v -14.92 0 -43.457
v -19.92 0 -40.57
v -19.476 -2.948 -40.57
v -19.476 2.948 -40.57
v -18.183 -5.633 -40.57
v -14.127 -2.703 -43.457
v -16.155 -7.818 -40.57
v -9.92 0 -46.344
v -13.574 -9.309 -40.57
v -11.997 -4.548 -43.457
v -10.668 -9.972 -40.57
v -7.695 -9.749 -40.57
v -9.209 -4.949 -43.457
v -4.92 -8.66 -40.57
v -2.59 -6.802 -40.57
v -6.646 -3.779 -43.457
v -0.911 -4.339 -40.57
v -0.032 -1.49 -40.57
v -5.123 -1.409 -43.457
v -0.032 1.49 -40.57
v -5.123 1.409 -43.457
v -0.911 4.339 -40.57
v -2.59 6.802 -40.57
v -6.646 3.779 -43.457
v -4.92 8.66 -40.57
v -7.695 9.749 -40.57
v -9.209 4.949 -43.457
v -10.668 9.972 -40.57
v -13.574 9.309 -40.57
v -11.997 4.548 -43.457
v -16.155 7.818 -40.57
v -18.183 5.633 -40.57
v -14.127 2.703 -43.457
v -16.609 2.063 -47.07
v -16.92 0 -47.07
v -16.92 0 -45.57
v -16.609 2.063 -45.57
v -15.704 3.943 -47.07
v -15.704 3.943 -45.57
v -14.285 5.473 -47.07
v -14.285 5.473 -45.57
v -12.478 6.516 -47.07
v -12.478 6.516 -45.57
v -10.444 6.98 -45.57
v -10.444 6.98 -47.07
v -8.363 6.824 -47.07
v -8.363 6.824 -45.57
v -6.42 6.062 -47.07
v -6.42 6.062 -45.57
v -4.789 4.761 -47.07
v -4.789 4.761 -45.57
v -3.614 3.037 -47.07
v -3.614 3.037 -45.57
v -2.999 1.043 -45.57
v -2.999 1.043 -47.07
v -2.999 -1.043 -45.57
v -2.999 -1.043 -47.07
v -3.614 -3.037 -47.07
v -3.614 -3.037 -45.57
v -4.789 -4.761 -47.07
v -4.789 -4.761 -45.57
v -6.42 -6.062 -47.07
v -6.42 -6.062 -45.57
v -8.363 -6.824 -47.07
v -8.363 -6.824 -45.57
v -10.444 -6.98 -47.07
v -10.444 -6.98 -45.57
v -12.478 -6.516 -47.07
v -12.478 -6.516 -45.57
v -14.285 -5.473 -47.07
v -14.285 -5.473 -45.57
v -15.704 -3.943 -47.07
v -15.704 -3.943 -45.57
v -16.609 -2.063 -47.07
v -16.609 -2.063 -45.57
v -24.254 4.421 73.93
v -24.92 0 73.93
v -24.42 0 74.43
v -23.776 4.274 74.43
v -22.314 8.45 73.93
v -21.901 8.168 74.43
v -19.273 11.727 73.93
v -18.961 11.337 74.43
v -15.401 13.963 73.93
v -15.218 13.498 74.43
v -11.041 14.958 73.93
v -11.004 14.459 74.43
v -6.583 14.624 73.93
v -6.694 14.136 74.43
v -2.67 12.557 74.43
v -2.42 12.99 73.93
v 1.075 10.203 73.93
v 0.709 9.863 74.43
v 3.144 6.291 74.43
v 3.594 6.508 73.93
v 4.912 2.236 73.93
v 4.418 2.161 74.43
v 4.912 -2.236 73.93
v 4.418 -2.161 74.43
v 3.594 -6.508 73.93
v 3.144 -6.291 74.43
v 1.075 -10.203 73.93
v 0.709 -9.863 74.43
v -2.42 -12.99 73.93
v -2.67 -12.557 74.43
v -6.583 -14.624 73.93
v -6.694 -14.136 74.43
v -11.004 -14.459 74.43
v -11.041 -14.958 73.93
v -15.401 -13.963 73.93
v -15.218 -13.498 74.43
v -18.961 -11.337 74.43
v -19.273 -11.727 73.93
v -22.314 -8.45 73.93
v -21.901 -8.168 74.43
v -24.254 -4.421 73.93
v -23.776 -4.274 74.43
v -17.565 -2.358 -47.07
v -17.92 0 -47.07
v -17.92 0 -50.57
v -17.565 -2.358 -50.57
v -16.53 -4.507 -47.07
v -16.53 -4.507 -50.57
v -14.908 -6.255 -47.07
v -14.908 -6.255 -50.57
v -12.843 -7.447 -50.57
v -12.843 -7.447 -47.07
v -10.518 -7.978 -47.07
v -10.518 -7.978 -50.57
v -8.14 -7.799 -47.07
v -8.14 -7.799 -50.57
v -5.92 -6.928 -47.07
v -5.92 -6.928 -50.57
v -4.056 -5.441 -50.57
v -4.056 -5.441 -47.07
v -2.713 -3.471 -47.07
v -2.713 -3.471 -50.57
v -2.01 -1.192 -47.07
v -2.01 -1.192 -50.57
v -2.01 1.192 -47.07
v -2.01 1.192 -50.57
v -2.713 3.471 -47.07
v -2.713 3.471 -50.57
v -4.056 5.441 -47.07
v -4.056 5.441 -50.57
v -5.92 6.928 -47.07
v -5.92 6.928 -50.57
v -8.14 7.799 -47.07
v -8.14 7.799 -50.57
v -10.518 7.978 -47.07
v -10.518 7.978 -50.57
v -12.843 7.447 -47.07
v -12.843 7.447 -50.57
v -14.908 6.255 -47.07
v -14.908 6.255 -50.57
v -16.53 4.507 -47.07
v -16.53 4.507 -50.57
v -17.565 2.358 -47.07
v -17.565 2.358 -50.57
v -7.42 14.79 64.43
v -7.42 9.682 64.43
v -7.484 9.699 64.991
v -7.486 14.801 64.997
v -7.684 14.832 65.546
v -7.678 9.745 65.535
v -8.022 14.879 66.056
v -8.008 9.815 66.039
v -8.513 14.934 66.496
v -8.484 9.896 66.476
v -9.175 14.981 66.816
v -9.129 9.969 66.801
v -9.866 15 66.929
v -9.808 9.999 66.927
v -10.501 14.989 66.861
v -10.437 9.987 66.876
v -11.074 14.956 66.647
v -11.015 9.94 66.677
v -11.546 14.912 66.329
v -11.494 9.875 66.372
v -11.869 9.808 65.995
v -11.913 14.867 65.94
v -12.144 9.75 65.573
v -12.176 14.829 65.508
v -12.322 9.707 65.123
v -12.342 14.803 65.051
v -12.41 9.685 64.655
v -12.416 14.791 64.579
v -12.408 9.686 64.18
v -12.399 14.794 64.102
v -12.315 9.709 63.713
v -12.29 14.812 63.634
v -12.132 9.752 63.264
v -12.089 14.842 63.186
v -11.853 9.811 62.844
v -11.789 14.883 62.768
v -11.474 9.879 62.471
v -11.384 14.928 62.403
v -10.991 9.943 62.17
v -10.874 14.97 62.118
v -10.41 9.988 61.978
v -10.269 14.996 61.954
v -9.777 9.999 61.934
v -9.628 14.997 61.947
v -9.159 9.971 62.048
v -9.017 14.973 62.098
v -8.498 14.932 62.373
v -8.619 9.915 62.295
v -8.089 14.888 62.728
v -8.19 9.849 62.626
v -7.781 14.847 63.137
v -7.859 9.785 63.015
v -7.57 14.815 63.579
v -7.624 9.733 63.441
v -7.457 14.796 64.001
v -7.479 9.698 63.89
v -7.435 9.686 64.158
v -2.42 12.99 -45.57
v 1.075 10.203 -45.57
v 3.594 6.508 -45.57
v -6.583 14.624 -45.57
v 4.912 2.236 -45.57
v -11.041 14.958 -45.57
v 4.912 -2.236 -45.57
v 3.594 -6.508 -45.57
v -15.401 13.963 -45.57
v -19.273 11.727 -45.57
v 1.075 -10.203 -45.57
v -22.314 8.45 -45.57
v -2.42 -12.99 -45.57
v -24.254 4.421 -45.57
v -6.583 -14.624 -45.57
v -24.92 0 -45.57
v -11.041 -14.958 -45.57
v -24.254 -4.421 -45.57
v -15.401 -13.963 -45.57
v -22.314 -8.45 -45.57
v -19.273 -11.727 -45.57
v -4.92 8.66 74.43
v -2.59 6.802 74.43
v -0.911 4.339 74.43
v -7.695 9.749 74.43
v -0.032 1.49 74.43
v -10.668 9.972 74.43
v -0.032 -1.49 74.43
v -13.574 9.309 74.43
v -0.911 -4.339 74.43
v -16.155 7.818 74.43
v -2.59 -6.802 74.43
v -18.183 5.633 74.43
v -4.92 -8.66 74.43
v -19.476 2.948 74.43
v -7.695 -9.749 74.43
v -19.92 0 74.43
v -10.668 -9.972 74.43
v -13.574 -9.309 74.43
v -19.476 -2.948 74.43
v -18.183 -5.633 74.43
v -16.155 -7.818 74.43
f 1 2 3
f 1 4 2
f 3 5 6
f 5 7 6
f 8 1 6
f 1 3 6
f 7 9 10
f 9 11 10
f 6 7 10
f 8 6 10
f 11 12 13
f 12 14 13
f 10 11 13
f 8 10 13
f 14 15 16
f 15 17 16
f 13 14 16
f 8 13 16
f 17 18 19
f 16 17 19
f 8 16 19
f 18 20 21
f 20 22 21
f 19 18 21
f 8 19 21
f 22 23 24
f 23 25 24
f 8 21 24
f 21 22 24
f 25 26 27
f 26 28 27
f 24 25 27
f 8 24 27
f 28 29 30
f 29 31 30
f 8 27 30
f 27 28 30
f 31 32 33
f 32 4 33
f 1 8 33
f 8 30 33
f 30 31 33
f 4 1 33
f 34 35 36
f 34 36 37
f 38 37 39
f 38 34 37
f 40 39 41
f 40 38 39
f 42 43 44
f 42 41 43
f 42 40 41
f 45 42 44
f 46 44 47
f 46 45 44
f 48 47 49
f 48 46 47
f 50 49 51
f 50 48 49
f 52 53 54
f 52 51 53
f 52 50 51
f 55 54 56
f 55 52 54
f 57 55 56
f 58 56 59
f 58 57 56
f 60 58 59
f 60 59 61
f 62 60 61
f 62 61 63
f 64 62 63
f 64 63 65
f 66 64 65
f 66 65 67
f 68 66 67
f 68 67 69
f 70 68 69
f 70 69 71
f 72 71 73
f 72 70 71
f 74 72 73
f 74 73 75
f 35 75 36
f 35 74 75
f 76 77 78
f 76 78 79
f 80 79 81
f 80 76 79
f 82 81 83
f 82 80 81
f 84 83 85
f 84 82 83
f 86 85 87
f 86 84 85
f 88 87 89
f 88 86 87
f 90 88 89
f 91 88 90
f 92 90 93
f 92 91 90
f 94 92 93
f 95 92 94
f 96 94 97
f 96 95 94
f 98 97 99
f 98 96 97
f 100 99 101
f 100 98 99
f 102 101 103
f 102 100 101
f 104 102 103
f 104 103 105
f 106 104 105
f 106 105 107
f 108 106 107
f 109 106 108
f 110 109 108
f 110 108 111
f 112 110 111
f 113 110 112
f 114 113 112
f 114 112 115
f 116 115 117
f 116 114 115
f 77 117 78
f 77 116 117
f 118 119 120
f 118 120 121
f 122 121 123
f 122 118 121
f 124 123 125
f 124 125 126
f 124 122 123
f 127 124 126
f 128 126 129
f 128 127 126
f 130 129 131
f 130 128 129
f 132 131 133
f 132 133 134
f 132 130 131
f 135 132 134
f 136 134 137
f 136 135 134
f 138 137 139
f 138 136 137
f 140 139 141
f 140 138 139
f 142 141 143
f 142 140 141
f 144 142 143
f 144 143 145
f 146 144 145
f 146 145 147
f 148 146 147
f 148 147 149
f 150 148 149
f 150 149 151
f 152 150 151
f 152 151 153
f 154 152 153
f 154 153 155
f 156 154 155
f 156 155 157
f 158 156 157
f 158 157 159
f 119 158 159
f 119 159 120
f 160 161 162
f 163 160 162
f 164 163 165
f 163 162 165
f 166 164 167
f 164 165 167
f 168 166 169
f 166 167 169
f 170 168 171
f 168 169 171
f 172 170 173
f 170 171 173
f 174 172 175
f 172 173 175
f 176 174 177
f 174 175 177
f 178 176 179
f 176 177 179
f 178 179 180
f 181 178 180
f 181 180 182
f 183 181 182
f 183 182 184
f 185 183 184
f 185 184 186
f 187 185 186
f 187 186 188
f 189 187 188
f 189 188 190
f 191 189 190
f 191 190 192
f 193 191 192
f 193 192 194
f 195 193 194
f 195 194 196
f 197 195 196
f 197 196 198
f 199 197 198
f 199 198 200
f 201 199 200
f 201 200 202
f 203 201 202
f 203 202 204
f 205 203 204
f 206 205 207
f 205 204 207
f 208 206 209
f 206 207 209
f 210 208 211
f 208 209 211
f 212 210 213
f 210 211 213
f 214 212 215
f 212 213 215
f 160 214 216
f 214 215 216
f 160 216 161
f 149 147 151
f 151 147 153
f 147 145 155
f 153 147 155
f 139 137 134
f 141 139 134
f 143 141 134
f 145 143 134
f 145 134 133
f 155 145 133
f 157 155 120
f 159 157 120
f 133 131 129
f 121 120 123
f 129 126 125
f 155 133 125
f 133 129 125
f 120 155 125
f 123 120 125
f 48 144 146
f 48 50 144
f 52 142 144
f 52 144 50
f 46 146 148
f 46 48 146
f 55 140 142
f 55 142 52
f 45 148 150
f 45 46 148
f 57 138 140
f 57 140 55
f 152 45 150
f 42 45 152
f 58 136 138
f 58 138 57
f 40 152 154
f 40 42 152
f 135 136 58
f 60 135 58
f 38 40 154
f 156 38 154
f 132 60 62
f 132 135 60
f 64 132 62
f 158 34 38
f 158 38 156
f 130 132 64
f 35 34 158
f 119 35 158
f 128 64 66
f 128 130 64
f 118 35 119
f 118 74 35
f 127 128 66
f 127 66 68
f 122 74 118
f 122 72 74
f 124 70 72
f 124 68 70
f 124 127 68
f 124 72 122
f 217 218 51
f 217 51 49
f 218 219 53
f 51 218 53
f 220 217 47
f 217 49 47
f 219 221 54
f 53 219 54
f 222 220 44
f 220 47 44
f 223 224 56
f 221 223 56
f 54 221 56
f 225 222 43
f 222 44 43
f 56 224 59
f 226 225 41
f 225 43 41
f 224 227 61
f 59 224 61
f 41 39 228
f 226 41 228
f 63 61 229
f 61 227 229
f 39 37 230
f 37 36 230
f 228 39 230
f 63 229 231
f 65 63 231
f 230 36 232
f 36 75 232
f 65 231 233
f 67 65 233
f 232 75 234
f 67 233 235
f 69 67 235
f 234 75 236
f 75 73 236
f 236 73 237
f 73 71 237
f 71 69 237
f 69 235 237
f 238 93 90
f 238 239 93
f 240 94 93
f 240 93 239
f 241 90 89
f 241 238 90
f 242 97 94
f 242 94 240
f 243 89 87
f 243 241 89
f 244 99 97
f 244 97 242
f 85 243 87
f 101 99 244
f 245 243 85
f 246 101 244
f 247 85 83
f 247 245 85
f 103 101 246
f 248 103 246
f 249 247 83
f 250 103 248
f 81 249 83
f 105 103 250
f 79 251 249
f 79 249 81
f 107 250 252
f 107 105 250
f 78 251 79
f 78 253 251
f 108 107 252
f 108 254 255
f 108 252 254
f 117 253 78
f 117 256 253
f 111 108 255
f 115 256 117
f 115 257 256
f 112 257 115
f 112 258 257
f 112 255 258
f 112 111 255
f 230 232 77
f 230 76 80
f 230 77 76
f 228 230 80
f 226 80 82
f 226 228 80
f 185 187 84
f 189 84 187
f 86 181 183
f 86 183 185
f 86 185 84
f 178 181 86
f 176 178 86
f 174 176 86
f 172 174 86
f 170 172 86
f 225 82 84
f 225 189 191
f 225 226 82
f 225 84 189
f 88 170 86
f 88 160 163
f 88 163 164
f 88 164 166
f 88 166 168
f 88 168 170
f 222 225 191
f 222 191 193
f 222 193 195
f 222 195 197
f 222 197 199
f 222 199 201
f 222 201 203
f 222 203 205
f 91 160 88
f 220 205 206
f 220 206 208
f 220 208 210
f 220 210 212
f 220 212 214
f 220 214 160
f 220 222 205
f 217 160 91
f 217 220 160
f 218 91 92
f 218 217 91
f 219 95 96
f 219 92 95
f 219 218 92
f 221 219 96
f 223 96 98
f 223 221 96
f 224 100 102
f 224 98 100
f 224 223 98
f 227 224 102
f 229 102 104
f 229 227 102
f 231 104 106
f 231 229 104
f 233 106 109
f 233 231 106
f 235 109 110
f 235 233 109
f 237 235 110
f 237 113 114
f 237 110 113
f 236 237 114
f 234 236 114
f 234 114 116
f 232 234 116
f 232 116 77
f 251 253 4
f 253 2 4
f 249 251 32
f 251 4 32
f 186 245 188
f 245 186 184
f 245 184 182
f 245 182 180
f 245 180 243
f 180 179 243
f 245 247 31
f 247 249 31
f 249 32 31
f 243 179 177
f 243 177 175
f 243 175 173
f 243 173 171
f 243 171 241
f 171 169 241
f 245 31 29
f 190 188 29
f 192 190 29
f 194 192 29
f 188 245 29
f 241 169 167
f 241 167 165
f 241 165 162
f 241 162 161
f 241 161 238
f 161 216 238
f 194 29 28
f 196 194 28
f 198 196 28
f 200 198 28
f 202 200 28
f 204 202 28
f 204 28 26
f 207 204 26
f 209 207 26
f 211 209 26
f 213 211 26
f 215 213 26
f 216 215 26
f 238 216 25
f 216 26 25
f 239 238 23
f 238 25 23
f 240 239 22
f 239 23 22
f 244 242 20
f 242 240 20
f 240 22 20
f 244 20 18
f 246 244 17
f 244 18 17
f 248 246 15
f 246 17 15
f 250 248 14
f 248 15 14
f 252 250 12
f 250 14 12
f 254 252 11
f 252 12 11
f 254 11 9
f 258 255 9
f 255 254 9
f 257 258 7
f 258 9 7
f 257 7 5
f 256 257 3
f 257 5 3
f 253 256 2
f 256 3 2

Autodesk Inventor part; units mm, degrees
ref_plane "YZ Plane" through (0, 0, 0) normal (1, 0, 0) x (0, 1, 0)
ref_plane "XZ Plane" through (0, 0, 0) normal (0, 1, 0) x (-1, 0, 0)
ref_plane "XY Plane" through (0, 0, 0) normal (0, 0, 1) x (1, 0, 0)
sketch "スケッチ1" plane through (0, 0, 0) normal (0, 1, 0) x (-1, 0, 0)
  line L0 (-5.0796, -45.5704) -> (-5.0796, 73.9296)
  line L1 (-5.0796, 73.9296) -> (-4.5796, 74.4296)
  line L2 (-4.5796, 74.4296) -> (24.4204, 74.4296)
  line L3 (24.4204, 74.4296) -> (24.9204, 73.9296)
  line L4 (24.9204, 73.9296) -> (24.9204, -45.5704)
  line L5 (24.9204, -45.5704) -> (-5.0796, -45.5704)
  line L6 (1.9204, -47.0704) -> (1.9204, -50.5704)
  line L7 (1.9204, -50.5704) -> (17.9204, -50.5704)
  line L8 (17.9204, -50.5704) -> (17.9204, -47.0704)
  line L9 (17.9204, -47.0704) -> (1.9204, -47.0704)
  line L10 (2.9204, -47.0704) -> (2.9204, -45.5704)
  line L11 (16.9204, -45.5704) -> (16.9204, -47.0704)
  line L12 (31.4204, 56.4296) -> (30.9204, 56.9296)
  line L13 (30.9204, 56.9296) -> (30.9204, 71.9296)
  line L14 (30.9204, 71.9296) -> (31.4204, 72.4296)
  line L15 (31.4204, 72.4296) -> (38.4204, 72.4296)
  line L16 (38.4204, 72.4296) -> (38.9204, 71.9296)
  line L17 (38.9204, 71.9296) -> (38.9204, 56.9296)
  line L18 (38.9204, 56.9296) -> (38.4204, 56.4296)
  line L19 (38.4204, 56.4296) -> (31.4204, 56.4296)
  line L20 (31.4204, 56.4296) -> (31.4204, 72.4296)
  line L21 (30.9204, 70.4296) -> (27.9204, 70.4296)
  line L22 (27.9204, 70.4296) -> (27.9204, 58.4296)
  line L23 (27.9204, 58.4296) -> (30.9204, 58.4296)
  line L24 (38.4204, 56.4296) -> (38.4204, 72.4296)
  line L25 (27.9204, 66.9296) -> (24.9204, 66.9296)
  line L26 (27.4204, 66.9296) -> (27.4204, 61.9296)
  line L27 (27.9204, 61.9296) -> (24.9204, 61.9296)
  line L28 (24.9204, 73.9296) -> (-5.0796, 73.9296)
  line L29 (-5.0796, 97.1797) -> (24.9204, 97.1797)
  line L30 (24.9204, 97.1797) -> (24.9204, 105.1797)
  line L31 (24.9204, 105.1797) -> (-5.0796, 105.1797)
  line L32 (-5.0796, 105.1797) -> (-5.0796, 97.1797)
  line L33 (24.9204, 99.1797) -> (27.9204, 99.1797)
  line L34 (27.2723, 99.1797) -> (27.2723, 103.1797)
  line L35 (27.9204, 103.1797) -> (24.9204, 103.1797)
  line L36 (27.9204, 105.6797) -> (27.9204, 96.6797)
  line L37 (27.9204, 96.6797) -> (28.4204, 96.1797)
  line L38 (28.4204, 96.1797) -> (32.4204, 96.1797)
  line L39 (32.4204, 96.1797) -> (32.9204, 96.6797)
  line L40 (32.9204, 96.6797) -> (32.9204, 105.6797)
  line L41 (32.9204, 105.6797) -> (32.4204, 106.1797)
  line L42 (32.4204, 106.1797) -> (28.4204, 106.1797)
  line L43 (28.4204, 106.1797) -> (27.9204, 105.6797)
  line L44 (28.4204, 106.1797) -> (28.4204, 96.1797)
  line L45 (32.4204, 96.1797) -> (32.4204, 106.1797)
  line L46 (2.4204, -50.5704) -> (2.4204, -47.0704)
  line L47 (-0.0796, -40.5704) -> (-0.0796, 74.4296)
  line L48 (19.9204, 74.4296) -> (19.9204, -40.5704)
  line L49 (19.9204, -40.5704) -> (9.9204, -46.3439)
  line L50 (9.9204, -46.3439) -> (-0.0796, -40.5704)
  line L51 (-0.0796, -40.5704) -> (19.9204, -40.5704)
  line L52 (17.4204, -47.0704) -> (17.4204, -50.5704)
  line L53 (9.9204, -56.5156) -> (9.9204, 78.76)
  line L54 (9.9204, 93.5864) -> (9.9204, 108.5157)
  line L55 (19.9204, 105.1797) -> (19.9204, 97.1797)
  line L56 (22.5096, 101.1797) -> (35.2156, 101.1797)
  line L57 (27.9204, 103.1797) -> (27.2723, 102.4797)
  line L58 (27.2723, 102.4797) -> (24.9204, 102.4797)
  line L59 (24.9204, 99.8797) -> (27.2723, 99.8797)
  line L60 (27.2723, 99.8797) -> (27.9204, 99.1797)
  line L61 (-0.0796, 97.1797) -> (-0.0796, 105.1797)
  line L62 (24.9204, 66.2296) -> (27.4204, 66.2296)
  line L63 (27.4204, 66.2296) -> (27.9204, 66.9296)
  line L64 (27.4204, 62.6296) -> (27.9204, 61.9296)
  line L65 (27.4204, 62.6296) -> (24.9204, 62.6296)
  line L66 (22.6428, 64.4296) -> (42.5049, 64.4296)
  line L67 (32.2954, 71.4296) -> (38.4204, 71.4296)
  line L68 (33.1704, 70.4296) -> (38.4204, 70.4296)
  line L69 (34.0454, 69.4296) -> (38.4204, 69.4296)
  line L70 (34.9204, 68.4296) -> (38.4204, 68.4296)
  line L71 (35.7954, 67.4296) -> (38.4204, 67.4296)
  line L72 (36.6704, 66.4296) -> (38.4204, 66.4296)
  line L73 (37.5454, 65.4296) -> (38.4204, 65.4296)
  line L74 (29.2204, 105.1797) -> (32.4204, 105.1797)
  line L75 (30.0204, 104.1797) -> (32.4204, 104.1797)
  line L76 (30.8204, 103.1797) -> (32.4204, 103.1797)
  line L77 (31.6204, 102.1797) -> (32.4204, 102.1797)
  point P0 (0, 0)
  point P1 (52.3578, -69.094)
  point P2 (52.3578, -59.2279)
  point P3 (9.9204, 74.4296)
  point P4 (9.9204, -45.5704)
  point P5 (11.2601, -45.5704)
  point P6 (9.9204, -46.3439)
  point P7 (9.9204, -50.5704)
  point P8 (24.4204, 74.4296)
revolve "回転1" add sketch "スケッチ1" angle 360 about axis through (-9.9204, 0, -56.5156) along (0, 0, 1) contours L49 L5 L11 L9 L53 | L9 L52 L7 L53 | L48 L2 L3 L28 | L28 L4 L5 L49 L48 | L9 L8 L7 L52
sketch "スケッチ2" plane through (-9.9204, 0, 74.4296) normal (0, 0, 1) x (1, 0, 0)
  line L0 (0, 0) -> (55.7189, 0) construction
  point P0 (9.9204, 0)
ref_plane "作業平面1" through (-9.9204, 0, 74.4296) normal (0, -1, 0) x (1, 0, 0)
sketch "スケッチ3" plane through (-9.9204, 0, 74.4296) normal (0, -1, 0) x (1, 0, 0)
  line L0 (10, 0) -> (-10, 0) projected
  line L1 (0, 0) -> (0, -10) construction
  circle A0 centre (0, -10) radius 2.5
  point P0 (9.9204, -74.4296)
  dimension "d2" = 10
  dimension "d3" = 5
extrude "押し出し1" cut sketch "スケッチ3" against normal through all
thread "ねじ1" size "M5x0.8" class "6H" standard "ANSI Metric M Profile" full length
thread "ねじ2" size "M16x2" class "6g" standard "ANSI Metric M Profile" full length
properties part number "stand_base" material "UHMW、黒"
